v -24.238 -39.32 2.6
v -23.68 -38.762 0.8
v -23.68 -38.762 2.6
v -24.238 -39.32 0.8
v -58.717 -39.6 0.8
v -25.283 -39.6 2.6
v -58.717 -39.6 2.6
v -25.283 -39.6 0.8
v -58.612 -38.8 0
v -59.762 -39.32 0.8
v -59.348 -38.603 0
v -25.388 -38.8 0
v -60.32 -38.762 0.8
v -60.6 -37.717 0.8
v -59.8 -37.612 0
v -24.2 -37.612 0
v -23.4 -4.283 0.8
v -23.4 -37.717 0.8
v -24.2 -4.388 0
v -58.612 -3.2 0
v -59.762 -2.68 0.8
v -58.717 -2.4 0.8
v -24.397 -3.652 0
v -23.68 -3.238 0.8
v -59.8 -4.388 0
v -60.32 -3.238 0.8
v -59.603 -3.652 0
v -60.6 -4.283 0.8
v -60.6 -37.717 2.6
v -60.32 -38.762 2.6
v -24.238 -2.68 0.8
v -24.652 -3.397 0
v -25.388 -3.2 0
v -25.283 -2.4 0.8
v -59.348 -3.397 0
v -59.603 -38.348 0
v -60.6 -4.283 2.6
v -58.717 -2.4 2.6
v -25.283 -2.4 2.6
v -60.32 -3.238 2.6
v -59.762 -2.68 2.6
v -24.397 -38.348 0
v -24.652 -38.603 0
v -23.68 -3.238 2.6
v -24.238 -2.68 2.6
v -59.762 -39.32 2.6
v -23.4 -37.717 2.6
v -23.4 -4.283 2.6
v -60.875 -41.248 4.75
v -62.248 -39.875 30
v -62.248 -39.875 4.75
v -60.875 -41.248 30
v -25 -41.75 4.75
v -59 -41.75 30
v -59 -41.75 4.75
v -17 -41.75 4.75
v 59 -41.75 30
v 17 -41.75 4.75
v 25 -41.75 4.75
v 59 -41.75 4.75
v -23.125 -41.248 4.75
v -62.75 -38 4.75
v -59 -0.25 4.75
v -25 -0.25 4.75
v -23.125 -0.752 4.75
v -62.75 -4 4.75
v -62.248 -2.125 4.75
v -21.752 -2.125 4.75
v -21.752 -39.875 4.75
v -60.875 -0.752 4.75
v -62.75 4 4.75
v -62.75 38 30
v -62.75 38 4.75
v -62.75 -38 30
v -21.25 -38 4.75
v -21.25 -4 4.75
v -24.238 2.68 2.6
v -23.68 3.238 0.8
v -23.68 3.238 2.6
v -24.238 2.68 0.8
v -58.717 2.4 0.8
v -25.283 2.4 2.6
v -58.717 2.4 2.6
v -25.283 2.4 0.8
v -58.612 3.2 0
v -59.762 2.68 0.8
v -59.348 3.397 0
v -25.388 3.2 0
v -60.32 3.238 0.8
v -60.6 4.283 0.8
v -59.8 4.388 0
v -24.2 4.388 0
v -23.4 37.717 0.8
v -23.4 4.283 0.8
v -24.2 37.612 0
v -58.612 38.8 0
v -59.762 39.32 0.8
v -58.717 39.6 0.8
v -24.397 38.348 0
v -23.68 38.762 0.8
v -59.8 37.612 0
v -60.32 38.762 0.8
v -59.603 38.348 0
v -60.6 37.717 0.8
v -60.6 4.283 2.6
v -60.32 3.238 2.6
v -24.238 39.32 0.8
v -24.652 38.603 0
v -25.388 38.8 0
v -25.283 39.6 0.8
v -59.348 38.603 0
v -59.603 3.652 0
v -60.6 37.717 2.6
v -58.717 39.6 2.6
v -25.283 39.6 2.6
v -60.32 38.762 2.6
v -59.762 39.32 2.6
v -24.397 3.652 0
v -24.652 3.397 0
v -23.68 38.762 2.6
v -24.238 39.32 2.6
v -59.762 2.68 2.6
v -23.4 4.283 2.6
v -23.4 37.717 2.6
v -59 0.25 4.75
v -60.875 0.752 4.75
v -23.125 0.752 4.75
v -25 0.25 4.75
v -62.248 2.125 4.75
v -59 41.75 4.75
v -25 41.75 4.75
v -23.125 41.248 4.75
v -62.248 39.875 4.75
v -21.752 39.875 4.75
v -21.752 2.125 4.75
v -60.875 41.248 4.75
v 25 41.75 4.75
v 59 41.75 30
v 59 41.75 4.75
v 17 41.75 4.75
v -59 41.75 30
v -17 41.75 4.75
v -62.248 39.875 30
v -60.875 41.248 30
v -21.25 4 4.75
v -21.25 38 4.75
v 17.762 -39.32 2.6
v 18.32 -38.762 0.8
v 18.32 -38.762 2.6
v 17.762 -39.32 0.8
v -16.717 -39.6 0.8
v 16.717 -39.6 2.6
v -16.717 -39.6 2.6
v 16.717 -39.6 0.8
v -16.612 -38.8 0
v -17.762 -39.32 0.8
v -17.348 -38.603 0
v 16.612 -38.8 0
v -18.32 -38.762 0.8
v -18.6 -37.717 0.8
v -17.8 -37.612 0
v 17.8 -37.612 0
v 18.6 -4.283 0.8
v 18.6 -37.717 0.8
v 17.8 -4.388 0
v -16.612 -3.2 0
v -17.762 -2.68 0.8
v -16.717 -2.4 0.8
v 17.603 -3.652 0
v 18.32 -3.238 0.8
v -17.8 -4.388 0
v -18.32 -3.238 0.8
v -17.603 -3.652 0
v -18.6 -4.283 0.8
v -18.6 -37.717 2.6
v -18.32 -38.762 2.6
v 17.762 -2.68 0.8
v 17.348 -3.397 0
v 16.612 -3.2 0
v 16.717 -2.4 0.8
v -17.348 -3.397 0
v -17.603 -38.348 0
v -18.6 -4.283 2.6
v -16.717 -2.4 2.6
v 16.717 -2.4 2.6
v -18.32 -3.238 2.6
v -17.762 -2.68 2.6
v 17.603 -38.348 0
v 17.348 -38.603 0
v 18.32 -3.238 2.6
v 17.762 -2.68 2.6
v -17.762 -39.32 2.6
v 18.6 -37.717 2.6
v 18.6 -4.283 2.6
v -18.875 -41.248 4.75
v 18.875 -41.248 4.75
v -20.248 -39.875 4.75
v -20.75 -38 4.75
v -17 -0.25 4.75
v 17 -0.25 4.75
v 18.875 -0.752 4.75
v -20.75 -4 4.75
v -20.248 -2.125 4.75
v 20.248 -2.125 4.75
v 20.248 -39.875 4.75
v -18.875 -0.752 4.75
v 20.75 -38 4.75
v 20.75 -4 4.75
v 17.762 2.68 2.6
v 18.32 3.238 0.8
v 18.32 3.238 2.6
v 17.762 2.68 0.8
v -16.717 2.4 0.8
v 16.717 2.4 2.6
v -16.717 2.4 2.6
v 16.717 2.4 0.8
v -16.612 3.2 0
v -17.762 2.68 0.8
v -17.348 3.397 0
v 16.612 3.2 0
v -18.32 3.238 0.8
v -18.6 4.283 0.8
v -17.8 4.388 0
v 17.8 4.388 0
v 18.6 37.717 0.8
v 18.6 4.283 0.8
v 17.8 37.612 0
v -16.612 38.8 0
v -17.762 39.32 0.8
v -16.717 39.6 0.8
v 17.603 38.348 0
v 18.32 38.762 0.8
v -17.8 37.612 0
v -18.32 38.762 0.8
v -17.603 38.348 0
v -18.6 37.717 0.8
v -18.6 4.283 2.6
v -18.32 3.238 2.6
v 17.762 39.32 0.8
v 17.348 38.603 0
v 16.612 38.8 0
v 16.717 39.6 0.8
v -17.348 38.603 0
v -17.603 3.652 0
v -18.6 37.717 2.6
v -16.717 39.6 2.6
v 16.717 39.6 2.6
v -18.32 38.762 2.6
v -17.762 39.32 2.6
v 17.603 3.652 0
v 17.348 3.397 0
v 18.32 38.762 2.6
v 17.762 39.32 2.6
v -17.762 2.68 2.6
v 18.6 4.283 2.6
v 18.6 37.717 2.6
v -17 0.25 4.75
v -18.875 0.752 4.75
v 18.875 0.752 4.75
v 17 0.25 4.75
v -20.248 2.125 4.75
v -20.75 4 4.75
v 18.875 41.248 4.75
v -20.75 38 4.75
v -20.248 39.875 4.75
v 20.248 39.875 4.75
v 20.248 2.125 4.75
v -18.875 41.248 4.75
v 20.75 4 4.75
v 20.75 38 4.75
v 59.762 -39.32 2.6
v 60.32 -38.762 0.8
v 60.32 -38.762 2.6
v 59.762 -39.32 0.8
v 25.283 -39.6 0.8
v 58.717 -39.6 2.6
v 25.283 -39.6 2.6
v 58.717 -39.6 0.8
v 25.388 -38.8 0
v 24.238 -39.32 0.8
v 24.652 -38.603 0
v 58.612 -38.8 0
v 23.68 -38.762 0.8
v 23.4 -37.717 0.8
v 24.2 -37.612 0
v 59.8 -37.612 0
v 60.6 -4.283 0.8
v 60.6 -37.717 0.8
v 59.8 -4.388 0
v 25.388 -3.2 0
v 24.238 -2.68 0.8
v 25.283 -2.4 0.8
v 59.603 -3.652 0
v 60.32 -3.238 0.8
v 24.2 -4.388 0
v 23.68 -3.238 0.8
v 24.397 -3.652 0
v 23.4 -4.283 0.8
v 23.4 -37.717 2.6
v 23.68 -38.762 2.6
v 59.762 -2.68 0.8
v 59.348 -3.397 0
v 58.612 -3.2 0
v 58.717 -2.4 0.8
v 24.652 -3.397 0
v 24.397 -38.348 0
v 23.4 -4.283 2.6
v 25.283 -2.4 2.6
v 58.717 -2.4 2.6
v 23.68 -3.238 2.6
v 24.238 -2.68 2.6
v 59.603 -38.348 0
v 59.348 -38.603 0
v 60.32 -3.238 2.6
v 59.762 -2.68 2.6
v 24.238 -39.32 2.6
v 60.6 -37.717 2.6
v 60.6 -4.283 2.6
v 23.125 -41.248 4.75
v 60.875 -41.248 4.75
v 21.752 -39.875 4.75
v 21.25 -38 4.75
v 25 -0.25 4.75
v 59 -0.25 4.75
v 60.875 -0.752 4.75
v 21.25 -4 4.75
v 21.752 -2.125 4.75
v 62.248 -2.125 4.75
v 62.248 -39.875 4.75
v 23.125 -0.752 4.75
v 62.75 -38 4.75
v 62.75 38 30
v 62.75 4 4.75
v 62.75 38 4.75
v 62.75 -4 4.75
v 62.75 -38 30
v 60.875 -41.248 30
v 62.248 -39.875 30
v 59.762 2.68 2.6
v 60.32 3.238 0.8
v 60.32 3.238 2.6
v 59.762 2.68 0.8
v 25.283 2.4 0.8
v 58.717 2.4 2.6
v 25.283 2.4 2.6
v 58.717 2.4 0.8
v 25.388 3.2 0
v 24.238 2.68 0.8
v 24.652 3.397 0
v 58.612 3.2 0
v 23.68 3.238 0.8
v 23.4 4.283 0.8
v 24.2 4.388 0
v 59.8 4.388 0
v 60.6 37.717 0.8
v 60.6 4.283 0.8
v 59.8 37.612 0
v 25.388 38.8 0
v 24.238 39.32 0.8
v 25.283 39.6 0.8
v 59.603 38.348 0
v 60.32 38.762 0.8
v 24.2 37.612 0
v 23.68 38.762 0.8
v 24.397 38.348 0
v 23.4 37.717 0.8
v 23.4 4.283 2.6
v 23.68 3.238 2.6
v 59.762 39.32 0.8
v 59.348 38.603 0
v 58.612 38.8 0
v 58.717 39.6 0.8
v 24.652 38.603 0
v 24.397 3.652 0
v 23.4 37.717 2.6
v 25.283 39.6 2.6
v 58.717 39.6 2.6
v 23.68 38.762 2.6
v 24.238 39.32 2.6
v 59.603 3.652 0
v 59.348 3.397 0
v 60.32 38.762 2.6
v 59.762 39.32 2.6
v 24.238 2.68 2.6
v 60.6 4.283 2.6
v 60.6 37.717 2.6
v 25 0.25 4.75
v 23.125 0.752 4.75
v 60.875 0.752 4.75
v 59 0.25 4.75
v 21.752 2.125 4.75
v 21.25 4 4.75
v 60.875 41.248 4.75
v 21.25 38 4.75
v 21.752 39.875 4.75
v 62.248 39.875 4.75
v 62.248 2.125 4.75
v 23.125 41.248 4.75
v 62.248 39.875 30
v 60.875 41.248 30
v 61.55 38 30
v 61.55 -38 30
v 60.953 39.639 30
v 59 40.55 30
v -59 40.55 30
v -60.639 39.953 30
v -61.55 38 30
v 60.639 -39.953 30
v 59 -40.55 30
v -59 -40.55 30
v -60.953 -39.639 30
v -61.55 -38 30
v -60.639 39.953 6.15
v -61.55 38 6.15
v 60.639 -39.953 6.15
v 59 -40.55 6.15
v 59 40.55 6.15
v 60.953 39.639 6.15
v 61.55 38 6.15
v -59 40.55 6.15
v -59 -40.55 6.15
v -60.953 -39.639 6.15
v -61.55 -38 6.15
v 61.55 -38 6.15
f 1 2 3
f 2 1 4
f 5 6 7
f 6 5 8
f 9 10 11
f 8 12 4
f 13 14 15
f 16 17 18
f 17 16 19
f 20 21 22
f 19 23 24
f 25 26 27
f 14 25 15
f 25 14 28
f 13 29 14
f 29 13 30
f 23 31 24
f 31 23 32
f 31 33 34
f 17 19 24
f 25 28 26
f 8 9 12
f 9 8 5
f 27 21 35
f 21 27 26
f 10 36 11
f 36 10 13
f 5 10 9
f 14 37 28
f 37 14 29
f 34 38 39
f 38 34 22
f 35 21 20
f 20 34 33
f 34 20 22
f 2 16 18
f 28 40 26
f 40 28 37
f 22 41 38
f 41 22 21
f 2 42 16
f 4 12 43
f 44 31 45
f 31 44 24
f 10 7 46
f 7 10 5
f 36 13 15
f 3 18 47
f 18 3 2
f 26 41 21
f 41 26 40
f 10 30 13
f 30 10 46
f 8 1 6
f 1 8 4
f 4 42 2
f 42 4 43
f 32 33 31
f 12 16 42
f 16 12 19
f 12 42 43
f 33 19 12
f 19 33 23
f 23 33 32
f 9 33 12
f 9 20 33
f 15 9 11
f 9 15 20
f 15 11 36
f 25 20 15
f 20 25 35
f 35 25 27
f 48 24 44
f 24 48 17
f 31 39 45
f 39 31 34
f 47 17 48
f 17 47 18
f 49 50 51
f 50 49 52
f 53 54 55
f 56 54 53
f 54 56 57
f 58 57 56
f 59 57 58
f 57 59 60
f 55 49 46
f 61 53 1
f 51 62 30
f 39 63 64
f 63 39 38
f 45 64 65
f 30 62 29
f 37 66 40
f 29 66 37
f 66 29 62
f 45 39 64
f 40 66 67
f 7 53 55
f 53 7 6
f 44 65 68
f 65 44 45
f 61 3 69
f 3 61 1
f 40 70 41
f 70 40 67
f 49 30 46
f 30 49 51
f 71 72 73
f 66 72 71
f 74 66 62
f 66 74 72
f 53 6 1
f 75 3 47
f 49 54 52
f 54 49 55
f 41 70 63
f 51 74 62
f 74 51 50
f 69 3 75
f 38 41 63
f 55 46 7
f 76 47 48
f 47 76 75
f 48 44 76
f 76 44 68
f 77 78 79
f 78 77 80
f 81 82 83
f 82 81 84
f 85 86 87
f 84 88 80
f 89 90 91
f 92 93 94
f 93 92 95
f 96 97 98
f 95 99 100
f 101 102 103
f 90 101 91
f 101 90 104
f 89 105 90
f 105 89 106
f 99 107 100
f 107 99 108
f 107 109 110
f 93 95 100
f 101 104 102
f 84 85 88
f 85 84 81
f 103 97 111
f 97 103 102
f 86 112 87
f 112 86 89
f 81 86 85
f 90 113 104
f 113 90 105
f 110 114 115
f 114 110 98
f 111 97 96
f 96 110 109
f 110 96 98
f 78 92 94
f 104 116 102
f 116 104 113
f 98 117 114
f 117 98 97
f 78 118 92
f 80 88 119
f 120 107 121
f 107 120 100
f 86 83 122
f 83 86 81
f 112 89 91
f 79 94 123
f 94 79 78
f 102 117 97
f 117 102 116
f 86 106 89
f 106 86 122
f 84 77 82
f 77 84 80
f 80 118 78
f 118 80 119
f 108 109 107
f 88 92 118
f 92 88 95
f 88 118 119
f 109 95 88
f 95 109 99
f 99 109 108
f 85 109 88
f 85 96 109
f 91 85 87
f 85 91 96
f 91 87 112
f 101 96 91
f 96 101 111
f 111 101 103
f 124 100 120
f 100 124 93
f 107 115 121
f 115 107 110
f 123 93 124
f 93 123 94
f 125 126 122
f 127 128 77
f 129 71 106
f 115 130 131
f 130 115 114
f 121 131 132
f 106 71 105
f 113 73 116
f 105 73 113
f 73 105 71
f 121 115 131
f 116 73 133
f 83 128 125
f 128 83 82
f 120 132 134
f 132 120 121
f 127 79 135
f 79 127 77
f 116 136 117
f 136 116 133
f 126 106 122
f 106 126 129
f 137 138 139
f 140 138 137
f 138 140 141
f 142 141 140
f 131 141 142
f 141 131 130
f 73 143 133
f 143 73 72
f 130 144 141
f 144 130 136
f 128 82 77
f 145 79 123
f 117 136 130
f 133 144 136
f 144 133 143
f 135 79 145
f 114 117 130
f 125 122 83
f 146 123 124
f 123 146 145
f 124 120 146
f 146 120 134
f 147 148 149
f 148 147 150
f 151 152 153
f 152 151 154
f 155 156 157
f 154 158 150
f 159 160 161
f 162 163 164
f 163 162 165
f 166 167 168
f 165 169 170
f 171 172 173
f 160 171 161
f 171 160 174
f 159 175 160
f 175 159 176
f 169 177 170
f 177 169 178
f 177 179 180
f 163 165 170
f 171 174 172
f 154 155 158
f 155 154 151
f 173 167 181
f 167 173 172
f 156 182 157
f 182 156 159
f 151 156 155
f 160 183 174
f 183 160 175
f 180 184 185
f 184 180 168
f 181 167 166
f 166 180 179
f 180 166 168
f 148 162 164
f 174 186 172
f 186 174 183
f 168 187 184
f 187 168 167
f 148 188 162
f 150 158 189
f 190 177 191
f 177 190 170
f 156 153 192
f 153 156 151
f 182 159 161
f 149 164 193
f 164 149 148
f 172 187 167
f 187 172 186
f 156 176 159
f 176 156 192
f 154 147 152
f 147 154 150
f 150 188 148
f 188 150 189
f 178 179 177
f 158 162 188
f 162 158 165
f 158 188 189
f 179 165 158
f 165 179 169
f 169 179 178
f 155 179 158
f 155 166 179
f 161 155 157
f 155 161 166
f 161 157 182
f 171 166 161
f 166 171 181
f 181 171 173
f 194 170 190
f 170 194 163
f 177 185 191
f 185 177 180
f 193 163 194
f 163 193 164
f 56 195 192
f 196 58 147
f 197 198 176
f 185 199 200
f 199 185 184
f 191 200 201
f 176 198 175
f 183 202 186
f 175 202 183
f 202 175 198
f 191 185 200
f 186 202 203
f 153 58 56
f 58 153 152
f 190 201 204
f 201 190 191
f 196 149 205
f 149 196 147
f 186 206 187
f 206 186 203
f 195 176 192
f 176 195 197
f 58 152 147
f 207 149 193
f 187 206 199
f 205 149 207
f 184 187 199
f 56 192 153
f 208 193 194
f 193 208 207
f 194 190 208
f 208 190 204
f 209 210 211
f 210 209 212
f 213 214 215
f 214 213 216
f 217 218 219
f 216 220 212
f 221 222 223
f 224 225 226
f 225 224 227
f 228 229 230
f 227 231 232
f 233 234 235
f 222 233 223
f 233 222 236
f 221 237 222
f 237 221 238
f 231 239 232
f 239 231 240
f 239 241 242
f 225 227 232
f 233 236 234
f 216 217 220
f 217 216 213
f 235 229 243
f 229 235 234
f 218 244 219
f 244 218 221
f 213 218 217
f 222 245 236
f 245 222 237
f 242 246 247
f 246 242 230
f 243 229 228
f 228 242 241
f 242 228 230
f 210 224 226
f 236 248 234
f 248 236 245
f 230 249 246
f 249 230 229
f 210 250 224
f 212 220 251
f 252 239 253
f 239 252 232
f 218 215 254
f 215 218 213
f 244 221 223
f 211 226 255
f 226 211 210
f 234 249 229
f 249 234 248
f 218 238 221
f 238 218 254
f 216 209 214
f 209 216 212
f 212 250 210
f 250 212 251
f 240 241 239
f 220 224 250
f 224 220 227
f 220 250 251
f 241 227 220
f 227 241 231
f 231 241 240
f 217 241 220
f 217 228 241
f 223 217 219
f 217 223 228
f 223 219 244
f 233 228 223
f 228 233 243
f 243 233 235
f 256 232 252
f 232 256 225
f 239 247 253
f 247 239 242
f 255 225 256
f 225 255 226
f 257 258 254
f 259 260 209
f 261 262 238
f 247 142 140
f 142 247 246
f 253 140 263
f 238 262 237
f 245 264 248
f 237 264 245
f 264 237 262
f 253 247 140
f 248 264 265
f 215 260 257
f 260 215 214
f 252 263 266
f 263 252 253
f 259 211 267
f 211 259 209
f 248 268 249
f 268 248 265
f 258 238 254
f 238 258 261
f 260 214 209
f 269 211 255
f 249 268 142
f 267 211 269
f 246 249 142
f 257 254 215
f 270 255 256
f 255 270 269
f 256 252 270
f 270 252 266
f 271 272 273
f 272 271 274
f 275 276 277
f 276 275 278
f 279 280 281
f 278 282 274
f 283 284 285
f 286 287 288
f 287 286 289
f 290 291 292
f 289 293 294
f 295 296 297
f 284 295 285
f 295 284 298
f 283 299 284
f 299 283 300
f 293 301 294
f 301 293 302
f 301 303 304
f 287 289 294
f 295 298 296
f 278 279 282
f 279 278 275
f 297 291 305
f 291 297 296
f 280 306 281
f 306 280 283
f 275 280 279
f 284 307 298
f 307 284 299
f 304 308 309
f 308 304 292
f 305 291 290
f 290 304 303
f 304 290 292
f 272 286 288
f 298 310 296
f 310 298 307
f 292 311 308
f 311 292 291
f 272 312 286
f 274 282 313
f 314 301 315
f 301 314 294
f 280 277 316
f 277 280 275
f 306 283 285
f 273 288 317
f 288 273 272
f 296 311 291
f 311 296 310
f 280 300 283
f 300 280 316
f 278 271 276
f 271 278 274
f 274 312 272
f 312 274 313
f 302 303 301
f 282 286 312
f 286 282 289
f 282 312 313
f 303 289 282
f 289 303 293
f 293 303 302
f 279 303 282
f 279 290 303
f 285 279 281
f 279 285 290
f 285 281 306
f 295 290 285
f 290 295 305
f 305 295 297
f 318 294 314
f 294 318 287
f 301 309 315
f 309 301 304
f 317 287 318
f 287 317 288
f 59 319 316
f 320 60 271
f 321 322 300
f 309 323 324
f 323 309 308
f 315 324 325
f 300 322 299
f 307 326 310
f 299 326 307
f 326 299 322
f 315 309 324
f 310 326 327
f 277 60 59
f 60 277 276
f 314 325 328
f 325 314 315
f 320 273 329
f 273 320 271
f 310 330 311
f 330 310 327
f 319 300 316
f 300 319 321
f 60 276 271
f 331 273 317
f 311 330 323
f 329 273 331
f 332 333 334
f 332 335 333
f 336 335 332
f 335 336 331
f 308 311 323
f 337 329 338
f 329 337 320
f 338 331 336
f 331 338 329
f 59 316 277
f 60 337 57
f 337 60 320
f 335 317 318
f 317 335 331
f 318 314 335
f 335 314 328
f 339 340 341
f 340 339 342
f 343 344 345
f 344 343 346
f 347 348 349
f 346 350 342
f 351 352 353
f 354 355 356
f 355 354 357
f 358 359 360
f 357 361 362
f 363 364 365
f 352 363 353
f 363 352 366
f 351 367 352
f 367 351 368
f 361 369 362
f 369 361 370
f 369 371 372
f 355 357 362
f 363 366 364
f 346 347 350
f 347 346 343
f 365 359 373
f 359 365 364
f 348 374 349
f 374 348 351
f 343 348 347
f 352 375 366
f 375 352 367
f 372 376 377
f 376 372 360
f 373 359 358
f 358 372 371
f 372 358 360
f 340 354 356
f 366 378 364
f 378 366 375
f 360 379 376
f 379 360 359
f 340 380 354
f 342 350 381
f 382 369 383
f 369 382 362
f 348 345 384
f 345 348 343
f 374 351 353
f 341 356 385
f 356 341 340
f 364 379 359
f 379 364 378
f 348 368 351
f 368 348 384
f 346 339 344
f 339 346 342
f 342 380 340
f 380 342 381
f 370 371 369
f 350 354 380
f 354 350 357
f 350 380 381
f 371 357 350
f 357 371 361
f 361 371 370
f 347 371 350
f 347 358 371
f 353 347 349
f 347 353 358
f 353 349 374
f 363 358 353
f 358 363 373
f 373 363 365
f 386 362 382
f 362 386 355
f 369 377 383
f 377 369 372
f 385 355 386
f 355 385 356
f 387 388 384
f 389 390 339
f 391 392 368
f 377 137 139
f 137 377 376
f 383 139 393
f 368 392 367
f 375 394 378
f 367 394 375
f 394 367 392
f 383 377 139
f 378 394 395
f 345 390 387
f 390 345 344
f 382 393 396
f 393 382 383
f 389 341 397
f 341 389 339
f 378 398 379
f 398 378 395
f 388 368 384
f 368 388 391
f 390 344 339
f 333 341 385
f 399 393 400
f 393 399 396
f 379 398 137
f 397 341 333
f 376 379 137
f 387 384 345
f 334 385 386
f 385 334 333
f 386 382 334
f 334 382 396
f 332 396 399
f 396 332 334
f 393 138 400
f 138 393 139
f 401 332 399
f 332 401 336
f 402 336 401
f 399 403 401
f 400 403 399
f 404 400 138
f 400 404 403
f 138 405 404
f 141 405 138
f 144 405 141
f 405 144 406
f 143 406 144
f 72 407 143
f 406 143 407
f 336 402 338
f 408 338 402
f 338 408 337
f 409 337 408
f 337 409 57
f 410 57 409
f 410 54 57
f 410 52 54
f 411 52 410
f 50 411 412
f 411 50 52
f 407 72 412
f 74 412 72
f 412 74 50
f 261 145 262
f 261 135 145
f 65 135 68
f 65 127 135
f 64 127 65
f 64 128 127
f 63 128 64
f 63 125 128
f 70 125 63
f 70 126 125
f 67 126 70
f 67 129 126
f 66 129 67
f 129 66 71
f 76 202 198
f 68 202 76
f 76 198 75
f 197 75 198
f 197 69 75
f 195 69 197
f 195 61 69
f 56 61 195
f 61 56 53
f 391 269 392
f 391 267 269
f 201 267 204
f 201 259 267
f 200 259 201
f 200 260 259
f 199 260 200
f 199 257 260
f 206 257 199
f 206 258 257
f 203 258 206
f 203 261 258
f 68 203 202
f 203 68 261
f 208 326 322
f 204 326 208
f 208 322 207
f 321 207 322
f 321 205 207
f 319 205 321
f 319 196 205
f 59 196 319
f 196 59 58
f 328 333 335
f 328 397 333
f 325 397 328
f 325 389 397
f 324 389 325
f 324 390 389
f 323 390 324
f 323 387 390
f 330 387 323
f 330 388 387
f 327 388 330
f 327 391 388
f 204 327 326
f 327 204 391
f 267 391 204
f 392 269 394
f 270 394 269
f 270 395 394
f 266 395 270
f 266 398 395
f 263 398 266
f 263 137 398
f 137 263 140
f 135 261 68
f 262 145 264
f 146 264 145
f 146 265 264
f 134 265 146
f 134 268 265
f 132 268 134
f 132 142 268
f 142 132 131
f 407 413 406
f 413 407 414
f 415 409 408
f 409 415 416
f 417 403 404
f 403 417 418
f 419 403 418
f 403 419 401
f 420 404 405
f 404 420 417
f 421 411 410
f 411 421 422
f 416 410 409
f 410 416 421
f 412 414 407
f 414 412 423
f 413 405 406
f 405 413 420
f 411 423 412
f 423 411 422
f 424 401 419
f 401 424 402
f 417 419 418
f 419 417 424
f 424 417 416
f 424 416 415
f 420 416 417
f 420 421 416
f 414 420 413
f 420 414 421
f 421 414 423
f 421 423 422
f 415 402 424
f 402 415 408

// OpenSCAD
// file: ../lib/gridfinity.scad
// gridfinity.scad — shared Gridfinity baseplate + bin library (per spec).
//
// 42 mm pitch, 41.5 mm bins, baseplate socket 0.7/1.8/2.15 = 4.65 mm, 4 mm
// fillet; bin foot 0.8/1.8/2.15 = 4.75 mm, 3.75 mm corner radius. Verified the
// bin foot seats in the baseplate socket with ~0.25–0.5 mm clearance.
//
//   baseplate(nx, ny)                      — tiled receiving baseplate
//   bin(nx, ny, h, wall, floor)            — open Gridfinity bin
//   divided_bin(nx, ny, h, cols, rows, …)  — bin with internal compartments

GF = 42; GF_FILLET = 4;
_C_TOP = 2.15; _C_MID = 1.8; _C_BOT = 0.7;
_BP_LIP = _C_TOP + _C_MID + _C_BOT; _BP_FLOOR = 1.2; BP_H = _BP_LIP + _BP_FLOOR;  // 5.85
BIN_SZ = 41.5; BIN_R = 3.75; BIN_BASE_H = 4.75;

// ---- baseplate ----
module _bp_cell(i = 0) { offset(r = -i) offset(r = GF_FILLET) offset(r = -GF_FILLET) square(GF, center = true); }
module _bp_socket() {
    e = 0.01;
    hull() { translate([0,0,BP_H-e]) linear_extrude(e) _bp_cell(0); translate([0,0,BP_H-_C_TOP]) linear_extrude(e) _bp_cell(_C_TOP); }
    translate([0,0,BP_H-_C_TOP-_C_MID]) linear_extrude(_C_MID) _bp_cell(_C_TOP);
    hull() { translate([0,0,BP_H-_C_TOP-_C_MID-e]) linear_extrude(e) _bp_cell(_C_TOP); translate([0,0,BP_H-_BP_LIP]) linear_extrude(e) _bp_cell(_C_TOP+_C_BOT); }
}
module baseplate(nx, ny) {
    w = nx*GF; d = ny*GF;
    difference() {
        translate([0,0,BP_H/2]) linear_extrude(BP_H, center=true) offset(GF_FILLET) offset(-GF_FILLET) square([w,d], center=true);
        for (ix=[0:nx-1], iy=[0:ny-1]) translate([(ix-(nx-1)/2)*GF, (iy-(ny-1)/2)*GF, 0]) _bp_socket();
    }
}

// ---- bin ----
module _bin_cell(i = 0) { offset(r = -i) offset(r = BIN_R) offset(r = -BIN_R) square(BIN_SZ, center = true); }
module _bin_foot() {
    e = 0.01;
    hull() { linear_extrude(e) _bin_cell(2.95); translate([0,0,0.8]) linear_extrude(e) _bin_cell(2.15); }    // bottom chamfer
    translate([0,0,0.8]) linear_extrude(1.8) _bin_cell(2.15);                                                 // vertical
    hull() { translate([0,0,2.6]) linear_extrude(e) _bin_cell(2.15); translate([0,0,BIN_BASE_H]) linear_extrude(e) _bin_cell(0); } // top chamfer
}
module _bin_shell(nx, ny, h, wall, floor) {
    W = nx*GF - 0.5; D = ny*GF - 0.5;
    difference() {
        union() {
            for (ix=[0:nx-1], iy=[0:ny-1]) translate([(ix-(nx-1)/2)*GF, (iy-(ny-1)/2)*GF, 0]) _bin_foot();
            translate([0,0,BIN_BASE_H]) linear_extrude(h-BIN_BASE_H) offset(BIN_R) offset(-BIN_R) square([W,D], center=true);
        }
        translate([0,0,BIN_BASE_H+floor]) linear_extrude(h) offset(BIN_R-wall) offset(-(BIN_R-wall)) square([W-2*wall, D-2*wall], center=true);
    }
}
module bin(nx, ny, h, wall = 1.2, floor = 1.4) { _bin_shell(nx, ny, h, wall, floor); }

module divided_bin(nx, ny, h, cols = 1, rows = 1, wall = 1.2, floor = 1.4, div = 1.2) {
    W = nx*GF - 0.5; D = ny*GF - 0.5;
    union() {
        bin(nx, ny, h, wall, floor);
        // internal divider walls (from the floor up to the rim)
        iw = W - 2*wall; id = D - 2*wall; z0 = BIN_BASE_H + floor;
        for (c = [1 : cols-1]) translate([-iw/2 + c*iw/cols - div/2, -id/2, z0]) cube([div, id, h - z0]);
        for (r = [1 : rows-1]) translate([-iw/2, -id/2 + r*id/rows - div/2, z0]) cube([iw, div, h - z0]);
    }
}
// file: apache_organizer_common.scad
// apache_organizer_common.scad — shared bits for the Apache 5800 cord organizer.
//
// Case interior: 514 × 289 × 144 mm. The floor is a 12 × 6 Gridfinity grid
// (504 × 252) printed as two 6 × 6 tiles; the ~37 mm spare on one long side is
// a cable channel, ~5 mm border at each end. Tiles butt and the case walls hold
// them; 2 alignment pegs per mating edge keep them flush and slide-together.

include <../lib/gridfinity.scad>

TILE_NX = 6; TILE_NY = 6;       // each tile (252 × 252)
PEG_D = 3.5; PEG_L = 6; PEG_Y = 60;

// Tile with alignment pegs on +X edge and matching holes on -X edge, so two
// identical tiles chain along the case length.
module organizer_tile() {
    w = TILE_NX * GF;            // 252
    difference() {
        union() {
            baseplate(TILE_NX, TILE_NY);
            for (y = [PEG_Y, -PEG_Y]) translate([w/2, y, BP_H/2]) rotate([0,90,0]) cylinder(d = PEG_D, h = PEG_L); // +X pegs
        }
        for (y = [PEG_Y, -PEG_Y]) translate([-w/2 - 0.1, y, BP_H/2]) rotate([0,90,0]) cylinder(d = PEG_D + 0.4, h = PEG_L + 1); // -X holes
    }
}
// main file
// bin_tray — shallow 3×2 parts tray for plugs / dongles / adapters.
include <apache_organizer_common.scad>
bin(3, 2, 30);
